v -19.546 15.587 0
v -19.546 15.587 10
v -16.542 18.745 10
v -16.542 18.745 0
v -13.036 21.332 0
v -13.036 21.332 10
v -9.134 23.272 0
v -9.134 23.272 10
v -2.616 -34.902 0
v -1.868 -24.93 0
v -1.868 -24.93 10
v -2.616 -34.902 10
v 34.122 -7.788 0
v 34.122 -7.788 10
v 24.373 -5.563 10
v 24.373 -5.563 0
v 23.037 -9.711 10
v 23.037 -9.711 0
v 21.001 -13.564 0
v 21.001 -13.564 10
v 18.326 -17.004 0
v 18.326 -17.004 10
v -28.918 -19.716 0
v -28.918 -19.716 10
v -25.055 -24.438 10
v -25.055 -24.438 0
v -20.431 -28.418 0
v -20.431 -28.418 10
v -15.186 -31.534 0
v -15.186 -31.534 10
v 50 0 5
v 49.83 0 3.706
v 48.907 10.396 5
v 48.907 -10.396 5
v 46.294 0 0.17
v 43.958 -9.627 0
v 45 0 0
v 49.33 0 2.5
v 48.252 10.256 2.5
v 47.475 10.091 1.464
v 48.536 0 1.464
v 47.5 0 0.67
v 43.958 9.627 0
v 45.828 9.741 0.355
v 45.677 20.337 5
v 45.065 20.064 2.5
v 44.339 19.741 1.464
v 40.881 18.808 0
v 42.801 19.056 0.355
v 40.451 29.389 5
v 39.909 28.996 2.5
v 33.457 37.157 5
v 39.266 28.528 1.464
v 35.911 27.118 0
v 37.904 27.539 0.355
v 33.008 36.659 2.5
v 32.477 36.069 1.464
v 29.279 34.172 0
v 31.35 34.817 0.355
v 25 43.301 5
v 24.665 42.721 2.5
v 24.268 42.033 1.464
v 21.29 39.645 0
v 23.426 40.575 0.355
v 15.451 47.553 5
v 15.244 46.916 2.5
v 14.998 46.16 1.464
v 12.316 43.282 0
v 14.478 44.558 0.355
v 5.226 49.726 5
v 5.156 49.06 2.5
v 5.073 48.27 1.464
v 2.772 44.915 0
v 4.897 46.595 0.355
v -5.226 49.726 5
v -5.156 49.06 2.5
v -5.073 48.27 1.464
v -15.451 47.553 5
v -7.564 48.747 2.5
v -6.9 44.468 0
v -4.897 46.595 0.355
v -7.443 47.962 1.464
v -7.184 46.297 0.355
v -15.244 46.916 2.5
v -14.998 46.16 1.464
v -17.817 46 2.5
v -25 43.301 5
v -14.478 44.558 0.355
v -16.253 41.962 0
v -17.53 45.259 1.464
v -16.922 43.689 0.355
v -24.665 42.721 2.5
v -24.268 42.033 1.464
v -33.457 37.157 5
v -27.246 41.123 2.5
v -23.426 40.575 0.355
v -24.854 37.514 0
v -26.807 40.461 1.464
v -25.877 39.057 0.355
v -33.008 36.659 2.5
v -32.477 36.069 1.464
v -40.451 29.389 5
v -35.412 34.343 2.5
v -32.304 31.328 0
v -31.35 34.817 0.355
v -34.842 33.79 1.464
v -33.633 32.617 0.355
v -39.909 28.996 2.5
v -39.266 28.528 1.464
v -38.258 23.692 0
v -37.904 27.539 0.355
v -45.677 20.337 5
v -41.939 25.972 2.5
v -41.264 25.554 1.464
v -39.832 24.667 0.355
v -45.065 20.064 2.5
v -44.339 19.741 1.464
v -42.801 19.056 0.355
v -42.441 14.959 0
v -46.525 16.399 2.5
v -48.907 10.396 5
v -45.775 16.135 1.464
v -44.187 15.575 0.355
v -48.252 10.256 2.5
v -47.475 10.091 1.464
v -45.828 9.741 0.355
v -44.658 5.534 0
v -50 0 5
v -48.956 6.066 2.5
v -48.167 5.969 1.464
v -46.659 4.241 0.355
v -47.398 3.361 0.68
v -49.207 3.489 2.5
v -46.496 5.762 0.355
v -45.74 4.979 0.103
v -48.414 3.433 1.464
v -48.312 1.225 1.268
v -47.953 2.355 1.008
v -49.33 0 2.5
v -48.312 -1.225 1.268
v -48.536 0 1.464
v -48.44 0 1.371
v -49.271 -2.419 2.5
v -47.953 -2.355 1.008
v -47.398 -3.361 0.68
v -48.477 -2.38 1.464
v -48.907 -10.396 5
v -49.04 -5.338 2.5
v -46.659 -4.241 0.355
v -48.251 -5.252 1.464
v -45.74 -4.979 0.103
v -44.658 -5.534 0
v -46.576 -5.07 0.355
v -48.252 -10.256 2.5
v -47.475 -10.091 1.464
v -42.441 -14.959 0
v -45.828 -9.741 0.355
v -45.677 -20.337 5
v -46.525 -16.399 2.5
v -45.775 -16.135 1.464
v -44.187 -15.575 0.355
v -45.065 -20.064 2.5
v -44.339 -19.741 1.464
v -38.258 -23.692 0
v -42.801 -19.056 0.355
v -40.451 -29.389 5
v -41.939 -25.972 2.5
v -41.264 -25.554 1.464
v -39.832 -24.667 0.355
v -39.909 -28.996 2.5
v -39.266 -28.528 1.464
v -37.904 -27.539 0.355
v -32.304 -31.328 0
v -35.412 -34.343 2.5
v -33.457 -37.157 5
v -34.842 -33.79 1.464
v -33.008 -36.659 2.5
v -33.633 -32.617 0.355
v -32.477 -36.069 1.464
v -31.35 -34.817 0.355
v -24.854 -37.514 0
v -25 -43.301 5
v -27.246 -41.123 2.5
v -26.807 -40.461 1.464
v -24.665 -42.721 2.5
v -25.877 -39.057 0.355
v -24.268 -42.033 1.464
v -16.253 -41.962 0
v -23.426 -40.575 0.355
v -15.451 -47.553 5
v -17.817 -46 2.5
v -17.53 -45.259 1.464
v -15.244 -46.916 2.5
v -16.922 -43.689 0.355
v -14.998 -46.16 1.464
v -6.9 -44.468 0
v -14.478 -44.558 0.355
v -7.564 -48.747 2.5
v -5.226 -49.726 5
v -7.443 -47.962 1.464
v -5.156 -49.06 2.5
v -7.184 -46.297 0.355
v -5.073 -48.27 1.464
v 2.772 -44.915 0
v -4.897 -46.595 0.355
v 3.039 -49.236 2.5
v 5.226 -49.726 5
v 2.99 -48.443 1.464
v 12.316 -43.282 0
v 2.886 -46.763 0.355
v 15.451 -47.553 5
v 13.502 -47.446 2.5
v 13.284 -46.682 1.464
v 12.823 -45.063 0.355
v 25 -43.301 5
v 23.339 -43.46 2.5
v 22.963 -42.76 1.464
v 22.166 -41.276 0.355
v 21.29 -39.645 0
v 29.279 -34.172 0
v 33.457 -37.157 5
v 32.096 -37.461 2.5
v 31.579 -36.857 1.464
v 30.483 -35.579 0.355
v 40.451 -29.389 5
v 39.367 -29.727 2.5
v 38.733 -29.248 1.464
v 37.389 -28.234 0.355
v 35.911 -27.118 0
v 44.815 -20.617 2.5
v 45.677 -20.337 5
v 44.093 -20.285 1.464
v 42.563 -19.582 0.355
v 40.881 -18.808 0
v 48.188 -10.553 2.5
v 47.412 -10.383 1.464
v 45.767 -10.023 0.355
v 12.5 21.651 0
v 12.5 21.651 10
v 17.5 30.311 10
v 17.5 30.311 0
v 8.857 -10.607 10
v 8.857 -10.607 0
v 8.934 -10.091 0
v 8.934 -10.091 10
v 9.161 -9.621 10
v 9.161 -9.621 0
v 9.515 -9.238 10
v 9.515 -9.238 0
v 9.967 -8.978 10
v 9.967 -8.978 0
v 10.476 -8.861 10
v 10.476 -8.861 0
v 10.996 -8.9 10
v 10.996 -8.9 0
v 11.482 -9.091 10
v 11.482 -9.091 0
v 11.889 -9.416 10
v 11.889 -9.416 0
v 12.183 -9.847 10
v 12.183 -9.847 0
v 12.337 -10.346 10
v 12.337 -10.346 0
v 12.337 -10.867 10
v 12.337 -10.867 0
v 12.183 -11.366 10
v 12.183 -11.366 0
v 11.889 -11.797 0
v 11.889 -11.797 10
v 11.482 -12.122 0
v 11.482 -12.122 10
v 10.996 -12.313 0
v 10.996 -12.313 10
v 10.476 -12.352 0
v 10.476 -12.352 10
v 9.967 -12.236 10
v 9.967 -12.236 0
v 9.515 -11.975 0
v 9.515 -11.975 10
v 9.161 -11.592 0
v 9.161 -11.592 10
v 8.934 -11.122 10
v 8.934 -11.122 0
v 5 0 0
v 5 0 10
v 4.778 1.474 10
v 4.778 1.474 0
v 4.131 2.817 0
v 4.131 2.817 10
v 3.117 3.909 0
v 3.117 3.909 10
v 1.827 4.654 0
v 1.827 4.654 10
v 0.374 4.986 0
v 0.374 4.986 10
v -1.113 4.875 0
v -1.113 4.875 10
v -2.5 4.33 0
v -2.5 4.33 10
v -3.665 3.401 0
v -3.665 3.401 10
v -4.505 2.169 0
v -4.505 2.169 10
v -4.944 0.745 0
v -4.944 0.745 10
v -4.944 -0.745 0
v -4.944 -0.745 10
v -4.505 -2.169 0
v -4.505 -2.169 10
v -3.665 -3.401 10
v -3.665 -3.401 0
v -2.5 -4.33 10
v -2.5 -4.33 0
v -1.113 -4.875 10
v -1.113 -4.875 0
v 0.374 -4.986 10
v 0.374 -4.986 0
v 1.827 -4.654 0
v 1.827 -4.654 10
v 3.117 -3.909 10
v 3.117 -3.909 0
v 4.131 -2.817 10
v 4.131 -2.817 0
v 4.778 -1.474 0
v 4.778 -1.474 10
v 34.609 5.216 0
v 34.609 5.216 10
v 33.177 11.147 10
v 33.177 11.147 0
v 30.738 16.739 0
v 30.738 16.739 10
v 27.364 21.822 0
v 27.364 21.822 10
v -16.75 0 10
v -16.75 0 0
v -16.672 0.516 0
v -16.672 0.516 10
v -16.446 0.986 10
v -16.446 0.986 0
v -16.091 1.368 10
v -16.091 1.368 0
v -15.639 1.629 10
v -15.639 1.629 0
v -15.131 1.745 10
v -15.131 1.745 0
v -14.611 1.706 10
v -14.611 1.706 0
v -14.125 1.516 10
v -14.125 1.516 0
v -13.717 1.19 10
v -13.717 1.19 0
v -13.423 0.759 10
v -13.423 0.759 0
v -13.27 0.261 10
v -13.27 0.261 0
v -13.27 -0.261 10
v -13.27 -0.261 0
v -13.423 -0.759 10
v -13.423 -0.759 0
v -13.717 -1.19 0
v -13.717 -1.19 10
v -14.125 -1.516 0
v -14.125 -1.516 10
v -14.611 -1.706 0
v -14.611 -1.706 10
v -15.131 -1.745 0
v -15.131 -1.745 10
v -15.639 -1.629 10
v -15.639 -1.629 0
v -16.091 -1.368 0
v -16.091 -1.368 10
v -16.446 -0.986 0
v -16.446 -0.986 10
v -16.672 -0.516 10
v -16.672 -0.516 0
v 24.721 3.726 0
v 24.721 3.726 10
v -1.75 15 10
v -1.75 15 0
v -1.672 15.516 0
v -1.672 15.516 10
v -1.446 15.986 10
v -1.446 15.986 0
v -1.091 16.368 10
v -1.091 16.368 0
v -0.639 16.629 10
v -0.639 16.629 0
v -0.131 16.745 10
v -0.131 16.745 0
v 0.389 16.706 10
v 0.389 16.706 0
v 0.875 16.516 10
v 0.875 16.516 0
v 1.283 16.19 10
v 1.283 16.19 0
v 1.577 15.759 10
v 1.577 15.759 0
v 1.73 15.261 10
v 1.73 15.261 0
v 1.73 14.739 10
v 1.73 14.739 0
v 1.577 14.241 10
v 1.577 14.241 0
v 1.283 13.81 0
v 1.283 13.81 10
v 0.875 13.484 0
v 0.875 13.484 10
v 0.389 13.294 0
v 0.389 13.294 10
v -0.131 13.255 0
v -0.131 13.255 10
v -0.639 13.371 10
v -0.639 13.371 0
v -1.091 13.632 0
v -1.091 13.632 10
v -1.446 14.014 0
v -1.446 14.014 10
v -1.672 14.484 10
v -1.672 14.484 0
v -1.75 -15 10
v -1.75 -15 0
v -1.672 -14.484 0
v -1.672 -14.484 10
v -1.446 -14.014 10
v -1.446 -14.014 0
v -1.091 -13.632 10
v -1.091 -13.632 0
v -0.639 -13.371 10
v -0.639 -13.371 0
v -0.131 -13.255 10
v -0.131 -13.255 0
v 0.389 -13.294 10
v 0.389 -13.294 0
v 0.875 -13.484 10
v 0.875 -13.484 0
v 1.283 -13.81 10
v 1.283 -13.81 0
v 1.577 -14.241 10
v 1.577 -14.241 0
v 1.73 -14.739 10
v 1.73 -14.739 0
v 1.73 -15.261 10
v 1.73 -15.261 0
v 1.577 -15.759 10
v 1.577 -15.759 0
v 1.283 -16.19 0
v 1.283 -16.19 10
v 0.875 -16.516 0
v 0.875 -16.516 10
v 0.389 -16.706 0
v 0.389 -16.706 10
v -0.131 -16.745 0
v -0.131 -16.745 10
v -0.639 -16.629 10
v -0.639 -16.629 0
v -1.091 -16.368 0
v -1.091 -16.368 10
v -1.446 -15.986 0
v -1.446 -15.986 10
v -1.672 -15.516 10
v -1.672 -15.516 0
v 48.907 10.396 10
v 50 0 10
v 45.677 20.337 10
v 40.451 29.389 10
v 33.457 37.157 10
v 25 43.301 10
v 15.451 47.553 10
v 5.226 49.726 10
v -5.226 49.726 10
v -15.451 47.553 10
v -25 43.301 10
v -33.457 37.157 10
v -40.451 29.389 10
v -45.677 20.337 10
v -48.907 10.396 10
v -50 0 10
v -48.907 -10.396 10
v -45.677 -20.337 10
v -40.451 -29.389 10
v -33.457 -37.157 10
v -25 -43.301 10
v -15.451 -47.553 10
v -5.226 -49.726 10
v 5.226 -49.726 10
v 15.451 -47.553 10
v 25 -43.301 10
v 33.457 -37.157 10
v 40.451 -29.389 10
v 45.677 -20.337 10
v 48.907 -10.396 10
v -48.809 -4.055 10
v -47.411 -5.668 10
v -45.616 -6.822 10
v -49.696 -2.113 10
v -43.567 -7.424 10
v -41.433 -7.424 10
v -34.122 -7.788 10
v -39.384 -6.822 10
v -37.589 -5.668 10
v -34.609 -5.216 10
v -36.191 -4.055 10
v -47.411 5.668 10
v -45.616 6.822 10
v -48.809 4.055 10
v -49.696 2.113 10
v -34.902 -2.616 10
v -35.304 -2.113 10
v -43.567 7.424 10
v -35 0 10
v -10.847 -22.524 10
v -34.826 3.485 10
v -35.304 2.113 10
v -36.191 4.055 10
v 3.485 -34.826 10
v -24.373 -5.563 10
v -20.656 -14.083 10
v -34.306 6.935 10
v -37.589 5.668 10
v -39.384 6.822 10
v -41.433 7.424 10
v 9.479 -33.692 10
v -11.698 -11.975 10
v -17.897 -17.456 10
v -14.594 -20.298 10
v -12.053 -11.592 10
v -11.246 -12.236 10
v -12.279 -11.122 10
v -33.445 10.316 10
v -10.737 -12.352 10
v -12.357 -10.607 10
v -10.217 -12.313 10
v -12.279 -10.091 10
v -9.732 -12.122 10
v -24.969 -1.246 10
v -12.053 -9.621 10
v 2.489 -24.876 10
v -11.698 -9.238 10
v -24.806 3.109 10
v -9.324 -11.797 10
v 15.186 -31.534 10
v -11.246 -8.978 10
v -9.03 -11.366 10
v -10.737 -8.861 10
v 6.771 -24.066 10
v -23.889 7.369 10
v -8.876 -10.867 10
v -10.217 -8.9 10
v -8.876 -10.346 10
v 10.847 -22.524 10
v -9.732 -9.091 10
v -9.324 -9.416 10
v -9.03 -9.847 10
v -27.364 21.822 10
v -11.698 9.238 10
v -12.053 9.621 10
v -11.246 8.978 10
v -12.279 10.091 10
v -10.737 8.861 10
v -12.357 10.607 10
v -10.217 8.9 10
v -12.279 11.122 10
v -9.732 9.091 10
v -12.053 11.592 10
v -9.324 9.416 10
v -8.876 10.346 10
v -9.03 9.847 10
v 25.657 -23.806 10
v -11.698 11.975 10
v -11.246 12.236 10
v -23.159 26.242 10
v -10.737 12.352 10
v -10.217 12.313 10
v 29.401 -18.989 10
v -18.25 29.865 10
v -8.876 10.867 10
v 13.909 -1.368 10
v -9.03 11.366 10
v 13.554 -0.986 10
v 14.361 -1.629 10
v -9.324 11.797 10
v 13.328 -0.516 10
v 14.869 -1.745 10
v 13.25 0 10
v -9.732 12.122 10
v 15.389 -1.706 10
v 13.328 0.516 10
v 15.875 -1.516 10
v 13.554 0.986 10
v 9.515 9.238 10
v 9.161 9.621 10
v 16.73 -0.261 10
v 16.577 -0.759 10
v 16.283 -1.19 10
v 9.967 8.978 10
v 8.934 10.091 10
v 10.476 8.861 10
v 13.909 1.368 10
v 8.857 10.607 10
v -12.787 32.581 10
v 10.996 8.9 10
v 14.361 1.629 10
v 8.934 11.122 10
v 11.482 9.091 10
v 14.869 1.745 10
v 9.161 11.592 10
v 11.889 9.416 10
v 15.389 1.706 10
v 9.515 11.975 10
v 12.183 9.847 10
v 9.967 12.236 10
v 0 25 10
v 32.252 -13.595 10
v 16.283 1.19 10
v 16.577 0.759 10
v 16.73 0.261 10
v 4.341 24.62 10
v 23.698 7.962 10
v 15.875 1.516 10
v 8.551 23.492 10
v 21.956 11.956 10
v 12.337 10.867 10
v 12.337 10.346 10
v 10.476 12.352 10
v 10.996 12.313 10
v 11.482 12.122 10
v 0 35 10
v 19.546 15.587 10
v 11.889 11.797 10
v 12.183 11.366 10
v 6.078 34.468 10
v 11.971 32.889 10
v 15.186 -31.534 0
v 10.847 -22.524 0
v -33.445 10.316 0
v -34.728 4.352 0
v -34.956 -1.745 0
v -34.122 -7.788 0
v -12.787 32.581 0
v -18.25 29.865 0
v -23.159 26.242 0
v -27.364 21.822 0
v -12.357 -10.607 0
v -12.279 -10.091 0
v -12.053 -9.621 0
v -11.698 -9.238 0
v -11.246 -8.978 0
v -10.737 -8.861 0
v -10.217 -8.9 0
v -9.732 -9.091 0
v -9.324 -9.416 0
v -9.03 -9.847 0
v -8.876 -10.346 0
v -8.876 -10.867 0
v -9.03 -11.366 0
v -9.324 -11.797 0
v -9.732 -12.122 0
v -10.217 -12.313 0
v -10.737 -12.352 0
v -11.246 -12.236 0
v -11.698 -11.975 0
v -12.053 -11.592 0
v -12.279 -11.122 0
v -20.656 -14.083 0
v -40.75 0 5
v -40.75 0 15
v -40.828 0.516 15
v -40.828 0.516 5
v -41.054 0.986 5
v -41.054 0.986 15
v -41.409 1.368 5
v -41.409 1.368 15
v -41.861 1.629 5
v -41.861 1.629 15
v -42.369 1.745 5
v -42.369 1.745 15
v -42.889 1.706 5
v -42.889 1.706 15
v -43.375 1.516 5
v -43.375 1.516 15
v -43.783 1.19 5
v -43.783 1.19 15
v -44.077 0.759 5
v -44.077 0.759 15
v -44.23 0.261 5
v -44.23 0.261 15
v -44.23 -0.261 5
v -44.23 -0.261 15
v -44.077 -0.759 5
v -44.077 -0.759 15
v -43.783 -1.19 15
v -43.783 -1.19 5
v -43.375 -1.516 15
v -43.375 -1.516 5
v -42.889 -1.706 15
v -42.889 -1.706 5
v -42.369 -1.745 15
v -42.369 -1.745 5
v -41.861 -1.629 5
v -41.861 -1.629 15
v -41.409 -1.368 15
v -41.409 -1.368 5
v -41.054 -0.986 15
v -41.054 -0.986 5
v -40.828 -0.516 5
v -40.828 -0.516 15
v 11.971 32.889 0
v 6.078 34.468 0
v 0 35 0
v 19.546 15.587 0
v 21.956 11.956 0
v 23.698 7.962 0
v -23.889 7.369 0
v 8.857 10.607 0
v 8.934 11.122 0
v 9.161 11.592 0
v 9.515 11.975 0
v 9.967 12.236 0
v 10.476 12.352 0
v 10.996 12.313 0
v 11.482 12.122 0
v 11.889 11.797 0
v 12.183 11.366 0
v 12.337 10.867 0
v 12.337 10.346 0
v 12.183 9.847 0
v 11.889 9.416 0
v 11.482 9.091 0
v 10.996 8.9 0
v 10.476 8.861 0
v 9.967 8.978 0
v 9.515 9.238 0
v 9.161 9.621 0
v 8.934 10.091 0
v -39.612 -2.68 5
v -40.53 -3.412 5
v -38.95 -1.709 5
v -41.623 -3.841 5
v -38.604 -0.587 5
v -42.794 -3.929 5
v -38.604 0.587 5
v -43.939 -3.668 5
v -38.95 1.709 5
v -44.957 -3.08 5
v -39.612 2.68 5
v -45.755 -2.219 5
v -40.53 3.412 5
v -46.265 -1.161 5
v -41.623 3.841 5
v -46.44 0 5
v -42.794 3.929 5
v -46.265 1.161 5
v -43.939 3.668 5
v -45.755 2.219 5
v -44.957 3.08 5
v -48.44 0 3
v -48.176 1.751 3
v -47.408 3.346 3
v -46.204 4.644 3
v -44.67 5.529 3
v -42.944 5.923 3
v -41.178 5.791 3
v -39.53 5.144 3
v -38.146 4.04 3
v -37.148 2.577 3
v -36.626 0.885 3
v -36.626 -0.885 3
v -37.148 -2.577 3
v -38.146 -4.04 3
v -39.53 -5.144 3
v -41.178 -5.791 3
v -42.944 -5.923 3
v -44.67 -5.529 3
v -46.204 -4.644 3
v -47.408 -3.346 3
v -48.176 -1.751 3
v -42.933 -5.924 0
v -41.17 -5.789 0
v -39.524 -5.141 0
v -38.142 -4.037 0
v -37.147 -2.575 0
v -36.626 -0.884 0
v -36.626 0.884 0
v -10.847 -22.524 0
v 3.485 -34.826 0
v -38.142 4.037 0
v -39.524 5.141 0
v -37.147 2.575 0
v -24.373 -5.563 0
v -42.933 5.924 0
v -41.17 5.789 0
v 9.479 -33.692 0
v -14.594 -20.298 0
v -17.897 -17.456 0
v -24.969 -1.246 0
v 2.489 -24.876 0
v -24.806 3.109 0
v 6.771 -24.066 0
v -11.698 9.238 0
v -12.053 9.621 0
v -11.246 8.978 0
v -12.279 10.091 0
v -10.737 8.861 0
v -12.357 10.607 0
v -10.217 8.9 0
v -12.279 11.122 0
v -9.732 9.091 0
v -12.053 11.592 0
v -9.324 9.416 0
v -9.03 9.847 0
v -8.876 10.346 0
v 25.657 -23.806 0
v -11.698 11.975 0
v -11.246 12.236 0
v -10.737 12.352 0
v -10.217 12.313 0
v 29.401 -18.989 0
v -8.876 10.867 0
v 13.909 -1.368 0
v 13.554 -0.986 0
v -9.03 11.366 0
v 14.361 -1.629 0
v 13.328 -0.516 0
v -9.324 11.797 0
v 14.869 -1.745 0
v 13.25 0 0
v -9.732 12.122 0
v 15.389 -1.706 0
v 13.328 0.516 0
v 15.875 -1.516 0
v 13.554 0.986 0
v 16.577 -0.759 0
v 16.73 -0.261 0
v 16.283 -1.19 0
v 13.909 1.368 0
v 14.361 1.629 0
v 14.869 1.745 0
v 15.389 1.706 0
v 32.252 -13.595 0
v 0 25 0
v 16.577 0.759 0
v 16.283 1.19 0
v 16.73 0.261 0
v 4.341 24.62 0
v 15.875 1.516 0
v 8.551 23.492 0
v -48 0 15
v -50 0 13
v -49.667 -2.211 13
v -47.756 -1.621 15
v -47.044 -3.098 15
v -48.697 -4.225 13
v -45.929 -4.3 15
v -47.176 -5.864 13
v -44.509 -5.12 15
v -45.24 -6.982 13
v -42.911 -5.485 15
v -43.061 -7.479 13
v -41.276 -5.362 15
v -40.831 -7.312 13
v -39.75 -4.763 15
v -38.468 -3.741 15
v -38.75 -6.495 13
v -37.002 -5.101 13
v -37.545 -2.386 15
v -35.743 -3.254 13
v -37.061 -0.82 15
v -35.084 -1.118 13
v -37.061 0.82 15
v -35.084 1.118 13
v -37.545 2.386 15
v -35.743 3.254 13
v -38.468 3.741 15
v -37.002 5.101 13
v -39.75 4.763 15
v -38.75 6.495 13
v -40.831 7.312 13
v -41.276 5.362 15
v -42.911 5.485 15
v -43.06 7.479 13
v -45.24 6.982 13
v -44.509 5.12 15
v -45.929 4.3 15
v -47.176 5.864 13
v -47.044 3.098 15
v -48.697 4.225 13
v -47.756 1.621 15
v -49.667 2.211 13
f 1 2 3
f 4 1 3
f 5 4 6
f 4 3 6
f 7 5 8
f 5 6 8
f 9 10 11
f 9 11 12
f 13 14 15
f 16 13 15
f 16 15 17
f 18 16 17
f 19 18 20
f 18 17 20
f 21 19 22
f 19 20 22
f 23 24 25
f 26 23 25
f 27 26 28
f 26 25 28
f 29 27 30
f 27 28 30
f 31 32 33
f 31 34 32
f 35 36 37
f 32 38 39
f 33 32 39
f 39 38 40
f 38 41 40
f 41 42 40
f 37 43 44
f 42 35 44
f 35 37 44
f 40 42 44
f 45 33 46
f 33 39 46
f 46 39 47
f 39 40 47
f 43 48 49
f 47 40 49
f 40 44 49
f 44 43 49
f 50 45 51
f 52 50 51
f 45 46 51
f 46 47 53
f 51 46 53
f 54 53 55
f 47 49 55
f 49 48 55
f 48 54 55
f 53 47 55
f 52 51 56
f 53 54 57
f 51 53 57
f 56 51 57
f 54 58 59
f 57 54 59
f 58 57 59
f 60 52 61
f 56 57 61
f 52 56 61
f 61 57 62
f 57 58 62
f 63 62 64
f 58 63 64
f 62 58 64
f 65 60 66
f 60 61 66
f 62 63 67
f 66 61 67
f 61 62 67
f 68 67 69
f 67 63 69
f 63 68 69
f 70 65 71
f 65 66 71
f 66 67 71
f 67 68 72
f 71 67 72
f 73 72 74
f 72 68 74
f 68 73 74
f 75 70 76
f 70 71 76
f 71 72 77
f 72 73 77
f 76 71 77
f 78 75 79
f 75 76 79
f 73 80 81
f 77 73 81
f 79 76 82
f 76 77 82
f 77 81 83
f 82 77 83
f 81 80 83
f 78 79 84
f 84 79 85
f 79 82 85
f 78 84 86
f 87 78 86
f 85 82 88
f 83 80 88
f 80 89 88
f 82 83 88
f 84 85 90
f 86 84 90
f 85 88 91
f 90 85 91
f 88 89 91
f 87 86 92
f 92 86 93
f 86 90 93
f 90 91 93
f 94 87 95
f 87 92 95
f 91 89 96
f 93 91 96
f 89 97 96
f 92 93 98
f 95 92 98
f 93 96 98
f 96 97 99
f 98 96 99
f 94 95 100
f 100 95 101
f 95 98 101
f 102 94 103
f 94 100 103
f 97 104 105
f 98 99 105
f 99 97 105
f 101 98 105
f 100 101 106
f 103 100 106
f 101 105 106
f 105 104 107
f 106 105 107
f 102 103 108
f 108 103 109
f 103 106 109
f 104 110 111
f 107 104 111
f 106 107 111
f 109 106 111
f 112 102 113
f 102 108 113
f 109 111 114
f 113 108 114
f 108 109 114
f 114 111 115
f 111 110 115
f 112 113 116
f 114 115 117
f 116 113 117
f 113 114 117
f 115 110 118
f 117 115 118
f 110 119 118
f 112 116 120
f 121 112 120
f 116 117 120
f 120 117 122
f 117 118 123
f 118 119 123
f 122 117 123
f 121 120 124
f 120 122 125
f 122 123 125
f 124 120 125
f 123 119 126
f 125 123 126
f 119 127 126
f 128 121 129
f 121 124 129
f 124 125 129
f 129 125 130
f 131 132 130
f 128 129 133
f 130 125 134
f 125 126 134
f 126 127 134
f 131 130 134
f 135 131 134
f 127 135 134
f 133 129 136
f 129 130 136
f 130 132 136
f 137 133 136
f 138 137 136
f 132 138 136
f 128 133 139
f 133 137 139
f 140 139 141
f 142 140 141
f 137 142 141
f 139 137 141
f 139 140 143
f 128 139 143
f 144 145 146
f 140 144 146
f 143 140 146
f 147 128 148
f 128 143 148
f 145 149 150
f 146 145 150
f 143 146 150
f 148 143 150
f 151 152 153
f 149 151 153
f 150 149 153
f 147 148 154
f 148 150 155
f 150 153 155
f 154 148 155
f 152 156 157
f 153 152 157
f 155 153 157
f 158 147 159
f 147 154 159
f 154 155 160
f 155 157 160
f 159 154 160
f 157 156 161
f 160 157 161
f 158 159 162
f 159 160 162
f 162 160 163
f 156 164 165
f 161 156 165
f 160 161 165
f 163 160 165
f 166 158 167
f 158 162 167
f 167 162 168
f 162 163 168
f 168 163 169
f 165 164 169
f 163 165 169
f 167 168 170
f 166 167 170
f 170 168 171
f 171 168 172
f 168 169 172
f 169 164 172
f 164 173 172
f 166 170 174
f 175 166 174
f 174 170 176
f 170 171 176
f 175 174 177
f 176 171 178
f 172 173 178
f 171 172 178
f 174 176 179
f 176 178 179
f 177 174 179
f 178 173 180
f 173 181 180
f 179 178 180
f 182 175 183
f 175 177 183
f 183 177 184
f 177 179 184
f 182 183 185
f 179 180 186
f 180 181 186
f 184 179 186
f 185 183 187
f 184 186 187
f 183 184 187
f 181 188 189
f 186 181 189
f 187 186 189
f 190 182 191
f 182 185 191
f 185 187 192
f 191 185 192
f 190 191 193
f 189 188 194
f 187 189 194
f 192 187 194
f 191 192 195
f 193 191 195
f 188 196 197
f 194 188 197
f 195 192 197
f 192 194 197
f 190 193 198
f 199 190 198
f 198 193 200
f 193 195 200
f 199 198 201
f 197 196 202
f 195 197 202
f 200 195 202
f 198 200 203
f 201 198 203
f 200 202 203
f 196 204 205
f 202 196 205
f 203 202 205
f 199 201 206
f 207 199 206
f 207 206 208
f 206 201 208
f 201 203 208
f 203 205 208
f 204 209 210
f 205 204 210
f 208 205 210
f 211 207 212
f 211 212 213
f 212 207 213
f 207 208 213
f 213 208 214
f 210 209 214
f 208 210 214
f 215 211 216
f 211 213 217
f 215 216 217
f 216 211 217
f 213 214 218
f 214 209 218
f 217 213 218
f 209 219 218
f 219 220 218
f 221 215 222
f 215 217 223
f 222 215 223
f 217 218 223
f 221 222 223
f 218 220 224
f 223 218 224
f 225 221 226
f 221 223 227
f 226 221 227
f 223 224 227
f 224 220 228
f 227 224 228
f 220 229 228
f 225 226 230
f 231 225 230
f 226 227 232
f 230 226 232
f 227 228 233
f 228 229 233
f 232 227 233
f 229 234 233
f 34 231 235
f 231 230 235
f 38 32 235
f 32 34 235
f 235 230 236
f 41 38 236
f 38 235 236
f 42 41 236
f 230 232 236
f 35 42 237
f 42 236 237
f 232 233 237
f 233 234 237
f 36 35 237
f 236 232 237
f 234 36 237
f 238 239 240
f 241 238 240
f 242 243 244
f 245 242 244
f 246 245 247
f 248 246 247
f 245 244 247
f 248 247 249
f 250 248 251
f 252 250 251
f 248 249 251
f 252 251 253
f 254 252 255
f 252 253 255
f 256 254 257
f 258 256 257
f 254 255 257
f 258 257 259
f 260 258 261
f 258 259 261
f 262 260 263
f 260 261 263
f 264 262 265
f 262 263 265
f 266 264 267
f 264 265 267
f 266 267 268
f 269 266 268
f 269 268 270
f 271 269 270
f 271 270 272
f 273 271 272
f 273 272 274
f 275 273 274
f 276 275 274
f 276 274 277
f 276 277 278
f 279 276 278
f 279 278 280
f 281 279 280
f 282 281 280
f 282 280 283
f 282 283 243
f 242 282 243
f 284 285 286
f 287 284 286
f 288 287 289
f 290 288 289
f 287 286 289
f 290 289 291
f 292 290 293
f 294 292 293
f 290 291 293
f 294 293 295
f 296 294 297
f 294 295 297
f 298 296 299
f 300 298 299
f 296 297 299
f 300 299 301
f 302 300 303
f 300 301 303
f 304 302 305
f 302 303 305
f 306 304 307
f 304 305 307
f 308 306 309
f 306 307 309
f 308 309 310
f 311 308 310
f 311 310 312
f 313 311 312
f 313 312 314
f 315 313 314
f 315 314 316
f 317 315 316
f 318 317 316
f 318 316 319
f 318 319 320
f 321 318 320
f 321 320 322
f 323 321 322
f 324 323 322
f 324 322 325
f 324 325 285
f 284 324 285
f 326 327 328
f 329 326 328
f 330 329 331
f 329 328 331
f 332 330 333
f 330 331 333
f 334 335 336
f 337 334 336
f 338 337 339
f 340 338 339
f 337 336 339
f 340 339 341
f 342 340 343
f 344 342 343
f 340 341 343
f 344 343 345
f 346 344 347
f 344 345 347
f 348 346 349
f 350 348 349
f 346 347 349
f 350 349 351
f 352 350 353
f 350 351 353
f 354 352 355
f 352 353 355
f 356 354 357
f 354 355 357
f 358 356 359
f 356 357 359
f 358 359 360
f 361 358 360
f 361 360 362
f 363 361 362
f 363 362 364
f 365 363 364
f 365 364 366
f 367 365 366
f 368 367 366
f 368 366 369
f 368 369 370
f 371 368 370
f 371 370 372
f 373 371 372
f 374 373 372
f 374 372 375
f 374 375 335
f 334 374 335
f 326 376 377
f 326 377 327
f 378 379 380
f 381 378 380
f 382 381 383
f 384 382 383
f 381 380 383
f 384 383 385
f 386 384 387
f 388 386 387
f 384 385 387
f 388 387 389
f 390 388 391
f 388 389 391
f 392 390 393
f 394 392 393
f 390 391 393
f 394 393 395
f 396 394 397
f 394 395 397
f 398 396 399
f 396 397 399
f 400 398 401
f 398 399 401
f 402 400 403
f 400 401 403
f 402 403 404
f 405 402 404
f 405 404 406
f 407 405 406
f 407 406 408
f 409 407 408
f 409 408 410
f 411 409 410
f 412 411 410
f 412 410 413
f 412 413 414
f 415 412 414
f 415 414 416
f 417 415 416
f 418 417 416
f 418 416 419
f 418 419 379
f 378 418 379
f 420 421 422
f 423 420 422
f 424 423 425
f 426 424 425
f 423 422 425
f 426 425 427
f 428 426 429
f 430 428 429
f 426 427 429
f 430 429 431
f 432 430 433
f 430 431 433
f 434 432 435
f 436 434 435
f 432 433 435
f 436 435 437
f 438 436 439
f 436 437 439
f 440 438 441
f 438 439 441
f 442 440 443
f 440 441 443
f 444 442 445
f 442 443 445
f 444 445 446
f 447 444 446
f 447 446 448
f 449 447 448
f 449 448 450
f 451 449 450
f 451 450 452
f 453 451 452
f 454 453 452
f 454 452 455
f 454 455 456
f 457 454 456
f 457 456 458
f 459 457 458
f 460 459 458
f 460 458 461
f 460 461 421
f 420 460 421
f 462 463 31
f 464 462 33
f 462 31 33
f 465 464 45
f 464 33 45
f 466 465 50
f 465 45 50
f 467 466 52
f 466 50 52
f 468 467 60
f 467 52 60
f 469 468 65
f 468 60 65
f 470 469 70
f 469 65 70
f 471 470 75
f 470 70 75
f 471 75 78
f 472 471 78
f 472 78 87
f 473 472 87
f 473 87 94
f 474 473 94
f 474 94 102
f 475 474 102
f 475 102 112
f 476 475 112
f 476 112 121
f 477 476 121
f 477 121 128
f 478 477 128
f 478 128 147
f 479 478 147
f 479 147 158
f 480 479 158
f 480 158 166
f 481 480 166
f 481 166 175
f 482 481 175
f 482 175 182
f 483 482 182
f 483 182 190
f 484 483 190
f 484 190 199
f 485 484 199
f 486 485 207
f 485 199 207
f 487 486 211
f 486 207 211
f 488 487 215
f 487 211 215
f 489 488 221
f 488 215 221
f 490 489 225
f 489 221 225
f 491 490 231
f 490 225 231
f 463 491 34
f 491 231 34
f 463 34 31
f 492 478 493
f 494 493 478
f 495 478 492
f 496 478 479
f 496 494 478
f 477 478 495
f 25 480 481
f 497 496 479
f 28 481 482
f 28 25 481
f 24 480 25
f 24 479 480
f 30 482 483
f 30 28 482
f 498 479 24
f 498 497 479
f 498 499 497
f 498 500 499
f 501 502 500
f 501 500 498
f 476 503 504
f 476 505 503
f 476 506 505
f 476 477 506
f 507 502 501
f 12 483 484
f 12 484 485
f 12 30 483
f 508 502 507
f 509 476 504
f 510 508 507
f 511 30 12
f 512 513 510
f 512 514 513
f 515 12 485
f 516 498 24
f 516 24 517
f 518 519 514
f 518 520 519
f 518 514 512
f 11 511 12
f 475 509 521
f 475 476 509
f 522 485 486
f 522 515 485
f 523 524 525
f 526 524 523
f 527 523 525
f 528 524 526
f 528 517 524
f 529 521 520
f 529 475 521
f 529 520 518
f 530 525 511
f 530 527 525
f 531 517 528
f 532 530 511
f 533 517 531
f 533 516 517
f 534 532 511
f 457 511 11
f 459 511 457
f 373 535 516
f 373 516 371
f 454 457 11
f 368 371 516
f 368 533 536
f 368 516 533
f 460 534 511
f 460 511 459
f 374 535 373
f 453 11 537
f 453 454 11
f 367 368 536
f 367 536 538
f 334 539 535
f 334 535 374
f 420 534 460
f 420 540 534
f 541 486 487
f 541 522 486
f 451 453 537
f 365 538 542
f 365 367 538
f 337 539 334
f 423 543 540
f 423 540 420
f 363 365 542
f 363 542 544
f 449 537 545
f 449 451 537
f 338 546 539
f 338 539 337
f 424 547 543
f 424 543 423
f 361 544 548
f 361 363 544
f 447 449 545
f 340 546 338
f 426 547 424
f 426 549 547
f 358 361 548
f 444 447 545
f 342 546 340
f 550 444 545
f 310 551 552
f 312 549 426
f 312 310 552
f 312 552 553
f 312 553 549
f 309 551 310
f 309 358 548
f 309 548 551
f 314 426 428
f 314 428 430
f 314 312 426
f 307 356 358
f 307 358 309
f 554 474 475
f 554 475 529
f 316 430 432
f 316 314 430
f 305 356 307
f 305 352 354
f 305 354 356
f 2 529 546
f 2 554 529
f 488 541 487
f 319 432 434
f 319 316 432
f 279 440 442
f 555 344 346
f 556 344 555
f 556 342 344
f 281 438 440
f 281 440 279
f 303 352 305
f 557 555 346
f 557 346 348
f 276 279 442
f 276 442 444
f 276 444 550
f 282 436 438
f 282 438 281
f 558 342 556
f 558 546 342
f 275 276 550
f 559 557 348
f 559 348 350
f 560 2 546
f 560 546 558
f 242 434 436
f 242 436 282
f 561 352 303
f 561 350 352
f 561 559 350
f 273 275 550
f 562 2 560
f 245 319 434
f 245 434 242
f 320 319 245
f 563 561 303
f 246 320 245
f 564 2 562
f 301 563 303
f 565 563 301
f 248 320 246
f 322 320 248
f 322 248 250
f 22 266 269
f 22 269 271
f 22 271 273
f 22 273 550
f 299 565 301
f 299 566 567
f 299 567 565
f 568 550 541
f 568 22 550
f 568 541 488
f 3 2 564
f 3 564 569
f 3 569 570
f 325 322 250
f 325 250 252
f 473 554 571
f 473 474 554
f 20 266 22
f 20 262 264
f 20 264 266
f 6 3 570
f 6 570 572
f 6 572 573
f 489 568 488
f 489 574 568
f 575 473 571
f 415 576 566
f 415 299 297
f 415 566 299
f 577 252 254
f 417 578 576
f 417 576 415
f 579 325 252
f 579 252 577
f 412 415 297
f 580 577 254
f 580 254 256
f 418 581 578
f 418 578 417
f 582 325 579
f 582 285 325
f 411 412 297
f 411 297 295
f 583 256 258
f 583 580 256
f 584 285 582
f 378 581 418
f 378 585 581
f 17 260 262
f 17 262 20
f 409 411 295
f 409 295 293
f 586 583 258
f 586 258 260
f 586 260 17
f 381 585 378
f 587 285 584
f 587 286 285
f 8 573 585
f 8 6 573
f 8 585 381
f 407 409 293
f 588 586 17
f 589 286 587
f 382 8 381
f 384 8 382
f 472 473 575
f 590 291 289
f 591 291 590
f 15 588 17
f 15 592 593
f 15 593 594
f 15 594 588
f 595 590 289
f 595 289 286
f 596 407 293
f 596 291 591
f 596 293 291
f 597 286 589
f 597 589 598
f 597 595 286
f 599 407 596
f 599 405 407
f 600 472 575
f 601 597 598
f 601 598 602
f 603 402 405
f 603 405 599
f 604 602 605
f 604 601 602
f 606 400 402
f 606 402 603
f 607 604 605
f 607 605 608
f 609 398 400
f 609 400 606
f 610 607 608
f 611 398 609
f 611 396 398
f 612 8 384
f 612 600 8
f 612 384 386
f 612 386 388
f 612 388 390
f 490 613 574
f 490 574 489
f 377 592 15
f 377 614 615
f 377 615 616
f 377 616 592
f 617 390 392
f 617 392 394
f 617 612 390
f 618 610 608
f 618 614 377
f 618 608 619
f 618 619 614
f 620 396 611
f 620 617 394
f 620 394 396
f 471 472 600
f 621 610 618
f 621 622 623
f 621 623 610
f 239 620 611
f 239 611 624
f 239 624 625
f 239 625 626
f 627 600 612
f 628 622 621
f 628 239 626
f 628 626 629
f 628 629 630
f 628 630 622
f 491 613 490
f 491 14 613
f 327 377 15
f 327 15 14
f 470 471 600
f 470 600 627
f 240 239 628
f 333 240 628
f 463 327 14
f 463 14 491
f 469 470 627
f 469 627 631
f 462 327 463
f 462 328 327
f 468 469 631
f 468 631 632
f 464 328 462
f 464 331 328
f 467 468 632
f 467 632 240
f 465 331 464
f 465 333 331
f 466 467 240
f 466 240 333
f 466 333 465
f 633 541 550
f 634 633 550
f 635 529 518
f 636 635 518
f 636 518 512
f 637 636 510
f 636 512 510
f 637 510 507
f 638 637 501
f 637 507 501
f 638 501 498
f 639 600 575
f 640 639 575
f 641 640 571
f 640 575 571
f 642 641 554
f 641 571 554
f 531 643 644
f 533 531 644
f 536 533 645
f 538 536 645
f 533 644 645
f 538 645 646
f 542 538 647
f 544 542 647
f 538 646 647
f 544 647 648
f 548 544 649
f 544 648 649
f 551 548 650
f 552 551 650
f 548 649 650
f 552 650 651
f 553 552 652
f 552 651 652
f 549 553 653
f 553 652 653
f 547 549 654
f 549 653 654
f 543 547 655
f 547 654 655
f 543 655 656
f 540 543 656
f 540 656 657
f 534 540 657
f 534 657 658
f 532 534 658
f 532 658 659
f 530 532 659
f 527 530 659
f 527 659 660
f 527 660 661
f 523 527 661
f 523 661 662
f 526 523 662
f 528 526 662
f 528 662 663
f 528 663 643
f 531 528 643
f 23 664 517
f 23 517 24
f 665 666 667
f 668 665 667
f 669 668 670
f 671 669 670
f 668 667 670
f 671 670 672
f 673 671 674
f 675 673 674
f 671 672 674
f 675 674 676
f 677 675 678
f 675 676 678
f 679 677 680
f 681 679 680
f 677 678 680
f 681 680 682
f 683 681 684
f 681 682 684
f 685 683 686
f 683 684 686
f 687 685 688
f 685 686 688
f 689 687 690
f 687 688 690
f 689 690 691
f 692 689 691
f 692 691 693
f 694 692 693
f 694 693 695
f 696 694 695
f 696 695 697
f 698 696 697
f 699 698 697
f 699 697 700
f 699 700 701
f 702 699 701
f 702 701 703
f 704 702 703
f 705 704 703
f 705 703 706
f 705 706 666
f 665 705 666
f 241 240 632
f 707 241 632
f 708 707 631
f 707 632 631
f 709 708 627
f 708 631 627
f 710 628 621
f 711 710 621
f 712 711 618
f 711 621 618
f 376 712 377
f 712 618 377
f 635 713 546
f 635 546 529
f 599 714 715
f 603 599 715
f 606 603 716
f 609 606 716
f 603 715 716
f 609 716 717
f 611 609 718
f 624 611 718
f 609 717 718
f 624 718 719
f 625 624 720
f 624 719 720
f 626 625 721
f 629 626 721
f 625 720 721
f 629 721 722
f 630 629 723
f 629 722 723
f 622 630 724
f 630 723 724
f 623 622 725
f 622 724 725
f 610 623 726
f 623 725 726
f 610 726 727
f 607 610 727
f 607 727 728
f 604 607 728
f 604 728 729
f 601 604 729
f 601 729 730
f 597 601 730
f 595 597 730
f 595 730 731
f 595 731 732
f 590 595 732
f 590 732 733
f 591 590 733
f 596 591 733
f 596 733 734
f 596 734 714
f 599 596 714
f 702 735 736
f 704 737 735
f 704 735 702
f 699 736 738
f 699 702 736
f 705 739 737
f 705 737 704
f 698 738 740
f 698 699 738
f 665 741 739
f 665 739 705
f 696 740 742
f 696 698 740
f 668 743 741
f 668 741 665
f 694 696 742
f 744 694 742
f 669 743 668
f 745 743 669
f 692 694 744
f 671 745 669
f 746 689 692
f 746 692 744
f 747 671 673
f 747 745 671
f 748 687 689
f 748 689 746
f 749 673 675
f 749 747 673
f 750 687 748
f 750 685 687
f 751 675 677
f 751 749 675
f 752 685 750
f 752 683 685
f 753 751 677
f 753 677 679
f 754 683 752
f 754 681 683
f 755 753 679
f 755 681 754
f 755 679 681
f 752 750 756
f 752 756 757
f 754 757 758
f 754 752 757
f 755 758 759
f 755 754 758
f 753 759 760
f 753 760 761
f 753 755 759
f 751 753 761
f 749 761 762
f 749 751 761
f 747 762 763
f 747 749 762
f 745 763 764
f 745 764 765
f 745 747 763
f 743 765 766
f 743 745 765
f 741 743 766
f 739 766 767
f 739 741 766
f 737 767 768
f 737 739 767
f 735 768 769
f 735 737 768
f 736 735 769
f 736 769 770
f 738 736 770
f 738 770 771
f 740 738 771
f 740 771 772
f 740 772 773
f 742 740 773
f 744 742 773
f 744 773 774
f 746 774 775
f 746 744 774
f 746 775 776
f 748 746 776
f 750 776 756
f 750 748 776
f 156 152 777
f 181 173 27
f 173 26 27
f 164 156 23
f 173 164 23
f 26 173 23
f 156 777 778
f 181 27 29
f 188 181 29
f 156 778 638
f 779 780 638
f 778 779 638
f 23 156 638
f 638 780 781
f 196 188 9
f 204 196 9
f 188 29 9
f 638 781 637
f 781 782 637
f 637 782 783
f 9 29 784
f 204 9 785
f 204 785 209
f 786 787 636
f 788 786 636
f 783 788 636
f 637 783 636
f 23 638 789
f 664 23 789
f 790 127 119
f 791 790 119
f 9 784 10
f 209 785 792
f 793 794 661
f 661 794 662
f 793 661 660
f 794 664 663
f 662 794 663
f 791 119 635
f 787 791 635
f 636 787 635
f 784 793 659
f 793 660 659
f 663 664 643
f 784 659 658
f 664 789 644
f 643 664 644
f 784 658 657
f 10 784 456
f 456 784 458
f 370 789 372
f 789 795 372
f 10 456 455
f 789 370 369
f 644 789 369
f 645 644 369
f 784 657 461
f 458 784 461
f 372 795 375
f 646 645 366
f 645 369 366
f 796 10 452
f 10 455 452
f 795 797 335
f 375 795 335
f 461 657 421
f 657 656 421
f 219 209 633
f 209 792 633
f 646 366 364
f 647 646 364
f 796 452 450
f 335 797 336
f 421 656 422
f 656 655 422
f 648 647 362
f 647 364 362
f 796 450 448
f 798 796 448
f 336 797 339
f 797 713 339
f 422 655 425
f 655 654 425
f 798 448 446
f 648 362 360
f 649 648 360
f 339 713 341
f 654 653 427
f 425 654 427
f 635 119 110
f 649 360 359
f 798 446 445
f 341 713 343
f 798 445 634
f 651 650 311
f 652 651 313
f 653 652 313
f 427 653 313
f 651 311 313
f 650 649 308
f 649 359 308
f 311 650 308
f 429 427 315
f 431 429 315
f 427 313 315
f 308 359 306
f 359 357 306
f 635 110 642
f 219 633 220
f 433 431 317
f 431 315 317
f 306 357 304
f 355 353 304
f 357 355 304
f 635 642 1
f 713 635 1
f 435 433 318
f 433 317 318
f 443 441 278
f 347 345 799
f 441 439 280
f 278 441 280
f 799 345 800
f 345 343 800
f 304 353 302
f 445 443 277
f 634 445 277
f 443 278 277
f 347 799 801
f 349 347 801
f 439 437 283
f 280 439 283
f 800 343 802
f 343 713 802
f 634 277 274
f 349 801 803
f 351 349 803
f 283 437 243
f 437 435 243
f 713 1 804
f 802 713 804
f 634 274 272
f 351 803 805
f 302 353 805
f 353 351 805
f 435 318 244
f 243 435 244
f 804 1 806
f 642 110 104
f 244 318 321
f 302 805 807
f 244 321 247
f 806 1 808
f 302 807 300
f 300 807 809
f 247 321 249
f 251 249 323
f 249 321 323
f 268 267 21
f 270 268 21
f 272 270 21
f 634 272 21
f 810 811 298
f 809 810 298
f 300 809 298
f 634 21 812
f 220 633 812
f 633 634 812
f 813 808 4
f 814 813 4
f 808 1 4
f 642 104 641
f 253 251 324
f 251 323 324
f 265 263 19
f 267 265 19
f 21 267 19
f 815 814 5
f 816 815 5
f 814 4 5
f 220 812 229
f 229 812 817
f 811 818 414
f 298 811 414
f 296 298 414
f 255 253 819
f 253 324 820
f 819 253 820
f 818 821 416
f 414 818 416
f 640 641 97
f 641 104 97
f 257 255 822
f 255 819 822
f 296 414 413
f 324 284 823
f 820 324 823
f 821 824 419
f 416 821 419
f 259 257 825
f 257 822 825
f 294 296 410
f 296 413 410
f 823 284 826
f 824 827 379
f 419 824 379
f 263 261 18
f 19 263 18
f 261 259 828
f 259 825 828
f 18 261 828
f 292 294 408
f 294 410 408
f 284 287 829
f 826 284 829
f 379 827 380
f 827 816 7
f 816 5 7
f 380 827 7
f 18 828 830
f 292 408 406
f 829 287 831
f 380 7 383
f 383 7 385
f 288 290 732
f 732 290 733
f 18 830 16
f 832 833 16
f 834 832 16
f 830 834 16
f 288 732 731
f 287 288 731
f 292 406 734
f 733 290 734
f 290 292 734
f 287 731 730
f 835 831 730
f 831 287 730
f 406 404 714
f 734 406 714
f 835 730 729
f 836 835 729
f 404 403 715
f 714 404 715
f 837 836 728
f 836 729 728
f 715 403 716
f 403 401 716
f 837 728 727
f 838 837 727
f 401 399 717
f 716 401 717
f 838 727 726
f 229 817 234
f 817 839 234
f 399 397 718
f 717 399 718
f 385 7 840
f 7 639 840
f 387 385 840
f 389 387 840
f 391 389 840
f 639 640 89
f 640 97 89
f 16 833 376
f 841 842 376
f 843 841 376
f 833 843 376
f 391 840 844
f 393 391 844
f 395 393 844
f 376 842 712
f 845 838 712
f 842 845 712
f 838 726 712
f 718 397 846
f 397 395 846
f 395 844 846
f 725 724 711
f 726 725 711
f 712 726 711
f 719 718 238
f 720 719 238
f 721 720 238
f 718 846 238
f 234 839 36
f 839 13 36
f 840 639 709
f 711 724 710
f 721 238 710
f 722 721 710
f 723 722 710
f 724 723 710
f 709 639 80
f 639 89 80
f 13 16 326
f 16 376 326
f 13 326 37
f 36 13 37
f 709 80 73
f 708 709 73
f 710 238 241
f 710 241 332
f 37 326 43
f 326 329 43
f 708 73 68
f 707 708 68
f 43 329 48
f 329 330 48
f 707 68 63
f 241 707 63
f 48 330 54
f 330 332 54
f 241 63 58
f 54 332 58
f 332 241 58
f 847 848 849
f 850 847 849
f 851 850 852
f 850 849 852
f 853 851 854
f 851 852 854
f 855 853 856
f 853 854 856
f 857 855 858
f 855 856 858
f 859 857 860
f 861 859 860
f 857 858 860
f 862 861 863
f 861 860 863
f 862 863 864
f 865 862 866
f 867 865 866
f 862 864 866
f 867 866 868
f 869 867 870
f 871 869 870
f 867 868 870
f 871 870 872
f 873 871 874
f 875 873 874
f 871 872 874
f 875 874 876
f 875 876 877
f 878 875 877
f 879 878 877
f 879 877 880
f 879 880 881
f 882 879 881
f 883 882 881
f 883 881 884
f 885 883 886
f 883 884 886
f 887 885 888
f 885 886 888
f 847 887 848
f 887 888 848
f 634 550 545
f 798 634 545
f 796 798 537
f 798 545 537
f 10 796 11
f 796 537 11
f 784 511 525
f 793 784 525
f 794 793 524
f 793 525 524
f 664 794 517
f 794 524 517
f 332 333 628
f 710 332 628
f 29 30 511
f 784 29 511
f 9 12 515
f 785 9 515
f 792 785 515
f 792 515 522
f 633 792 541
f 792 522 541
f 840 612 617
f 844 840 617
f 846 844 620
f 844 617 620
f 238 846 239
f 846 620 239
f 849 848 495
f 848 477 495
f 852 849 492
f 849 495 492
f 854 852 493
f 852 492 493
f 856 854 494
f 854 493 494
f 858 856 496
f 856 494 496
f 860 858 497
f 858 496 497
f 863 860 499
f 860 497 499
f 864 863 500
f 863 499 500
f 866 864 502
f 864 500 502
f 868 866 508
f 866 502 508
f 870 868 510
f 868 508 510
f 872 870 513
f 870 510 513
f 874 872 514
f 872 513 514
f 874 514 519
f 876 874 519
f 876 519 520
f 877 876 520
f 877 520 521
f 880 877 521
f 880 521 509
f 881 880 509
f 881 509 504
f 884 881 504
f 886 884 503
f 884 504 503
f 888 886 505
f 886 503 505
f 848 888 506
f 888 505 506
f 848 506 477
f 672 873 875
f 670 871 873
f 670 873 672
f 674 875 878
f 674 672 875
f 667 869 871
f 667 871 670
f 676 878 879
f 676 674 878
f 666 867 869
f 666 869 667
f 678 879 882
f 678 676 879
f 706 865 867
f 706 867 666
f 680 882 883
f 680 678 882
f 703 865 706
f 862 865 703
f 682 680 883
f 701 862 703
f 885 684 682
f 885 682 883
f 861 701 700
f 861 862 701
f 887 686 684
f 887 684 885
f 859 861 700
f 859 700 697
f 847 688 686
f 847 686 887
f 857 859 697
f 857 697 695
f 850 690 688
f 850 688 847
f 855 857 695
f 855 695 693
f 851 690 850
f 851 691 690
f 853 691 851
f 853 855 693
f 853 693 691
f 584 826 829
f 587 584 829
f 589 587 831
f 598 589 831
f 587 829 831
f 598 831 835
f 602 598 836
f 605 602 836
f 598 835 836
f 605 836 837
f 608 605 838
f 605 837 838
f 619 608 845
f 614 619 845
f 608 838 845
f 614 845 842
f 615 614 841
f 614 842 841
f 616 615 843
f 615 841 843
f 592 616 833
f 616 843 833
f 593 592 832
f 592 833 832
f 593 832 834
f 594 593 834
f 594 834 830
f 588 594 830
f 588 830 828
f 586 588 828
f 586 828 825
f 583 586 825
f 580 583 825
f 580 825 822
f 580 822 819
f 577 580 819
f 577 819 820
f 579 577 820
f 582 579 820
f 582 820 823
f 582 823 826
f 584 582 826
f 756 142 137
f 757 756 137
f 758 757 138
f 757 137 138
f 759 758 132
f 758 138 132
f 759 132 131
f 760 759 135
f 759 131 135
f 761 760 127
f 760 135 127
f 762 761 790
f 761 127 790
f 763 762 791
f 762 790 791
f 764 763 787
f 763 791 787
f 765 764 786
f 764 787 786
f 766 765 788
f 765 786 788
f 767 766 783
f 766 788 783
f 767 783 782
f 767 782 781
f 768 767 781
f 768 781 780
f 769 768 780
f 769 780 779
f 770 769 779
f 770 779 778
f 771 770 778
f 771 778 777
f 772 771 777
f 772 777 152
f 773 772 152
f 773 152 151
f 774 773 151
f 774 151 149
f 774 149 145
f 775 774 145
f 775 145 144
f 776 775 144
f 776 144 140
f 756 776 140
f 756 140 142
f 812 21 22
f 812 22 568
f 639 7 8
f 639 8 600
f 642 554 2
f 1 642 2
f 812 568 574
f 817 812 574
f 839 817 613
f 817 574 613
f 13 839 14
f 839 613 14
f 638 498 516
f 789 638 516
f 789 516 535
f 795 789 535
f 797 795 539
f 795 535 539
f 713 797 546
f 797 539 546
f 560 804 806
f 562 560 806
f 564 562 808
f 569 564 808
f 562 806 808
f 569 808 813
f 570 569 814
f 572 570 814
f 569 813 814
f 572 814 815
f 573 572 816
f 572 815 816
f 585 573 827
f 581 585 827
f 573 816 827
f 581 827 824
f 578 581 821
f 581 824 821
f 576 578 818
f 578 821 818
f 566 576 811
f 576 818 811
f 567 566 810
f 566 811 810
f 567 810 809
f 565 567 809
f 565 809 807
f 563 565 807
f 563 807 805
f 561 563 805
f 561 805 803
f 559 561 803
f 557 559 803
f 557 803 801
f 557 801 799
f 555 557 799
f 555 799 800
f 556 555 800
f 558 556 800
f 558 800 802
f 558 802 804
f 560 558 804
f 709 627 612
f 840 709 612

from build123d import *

# Parameters (mm, degrees)
SKETCH1_R           = 50
BOSS_EXTRUDE1_DEPTH = 10
SKETCH2_R           = 5
CUT_EXTRUDE1_DEPTH  = 72.414284285
FILLET1_R           = 5
SKETCH3_R           = 1.75
CUT_EXTRUDE2_DEPTH  = 72.414284425
SKETCH5_R           = 7.5
BOSS_EXTRUDE2_DEPTH = 5
SKETCH6_R           = 1.75
CUT_EXTRUDE3_DEPTH  = 73.284161612
SKETCH7_R           = 5.939963611
CUT_EXTRUDE4_DEPTH  = 5
CHAMFER1_SIZE       = 2
CHAMFER2_SIZE       = 2
CUT_EXTRUDE5_DEPTH  = 72.414284439
CIRPATTERN1_COUNT   = 7


with BuildPart() as part:
    # Sketch1 → Boss-Extrude1 (new body)
    with BuildSketch(Plane.XY):
        Circle(SKETCH1_R)
    extrude(amount=BOSS_EXTRUDE1_DEPTH)

    # Sketch2 → Cut-Extrude1 (cut, through all)
    with BuildSketch(Plane.XY.offset(10)):
        Circle(SKETCH2_R)
    extrude(amount=-CUT_EXTRUDE1_DEPTH, mode=Mode.SUBTRACT)

    # Fillet1
    fillet1_edges = [part.edges().sort_by_distance(p)[0] for p in [
        (-50, 0, 0),
    ]]
    fillet(fillet1_edges, radius=FILLET1_R)

    # Sketch3 → Cut-Extrude2 (cut, through all)
    with BuildSketch(Plane(origin=(0, 0, 0), x_dir=(-1, 0, 0), z_dir=(0, 0, -1))):
        with Locations((0, 15)):
            Circle(SKETCH3_R)
        with Locations((10.606601718, 10.606601718)):
            Circle(SKETCH3_R)
        with Locations((15, 0)):
            Circle(SKETCH3_R)
        with Locations((10.606601718, -10.606601718)):
            Circle(SKETCH3_R)
        with Locations((0, -15)):
            Circle(SKETCH3_R)
        with Locations((-10.606601718, -10.606601718)):
            Circle(SKETCH3_R)
        with Locations((-15, 0)):
            Circle(SKETCH3_R)
        with Locations((-10.606601718, 10.606601718)):
            Circle(SKETCH3_R)
    extrude(amount=-CUT_EXTRUDE2_DEPTH, mode=Mode.SUBTRACT)

    # Sketch5 → Boss-Extrude2 (add)
    with BuildSketch(Plane.XY.offset(10)):
        with Locations(Location((-42.5, 0, 0), (0, 0, 179.999679023))):
            Circle(SKETCH5_R)
    extrude(amount=BOSS_EXTRUDE2_DEPTH)

    # Sketch6 → Cut-Extrude3 (cut, through all)
    with BuildSketch(Plane.XY.offset(15)):
        with Locations((-42.5, 0)):
            Circle(SKETCH6_R)
    extrude(amount=-CUT_EXTRUDE3_DEPTH, mode=Mode.SUBTRACT)

    # Sketch7 → Cut-Extrude4 (cut)
    with BuildSketch(Plane(origin=(0, 0, 0), x_dir=(-1, 0, 0), z_dir=(0, 0, -1))):
        with Locations((42.5, 0)):
            Circle(SKETCH7_R)
    extrude(amount=-CUT_EXTRUDE4_DEPTH, mode=Mode.SUBTRACT)

    # Chamfer1
    chamfer1_edges = [part.edges().sort_by_distance(p)[0] for p in [
        (-36.560036389, 0, 5),
    ]]
    chamfer(chamfer1_edges, length=CHAMFER1_SIZE)

    # Chamfer2
    chamfer2_edges = [part.edges().sort_by_distance(p)[0] for p in [
        (-35, -4.2016e-05, 15),
    ]]
    chamfer(chamfer2_edges, length=CHAMFER2_SIZE)

    # Sketch8 → Cut-Extrude5 (cut, through all)
    with BuildSketch(Plane.XY.offset(10)):
        with BuildLine():
            Line((0, 35), (0, 25))
            ThreePointArc((0, 25), (6.470476128, 24.148145657), (12.5, 21.650635095))
            Line((12.5, 21.650635095), (17.5, 30.310889132))
            ThreePointArc((17.5, 30.310889132), (9.058666579, 33.80740392), (0, 35))
        make_face()
    cut_extrude5 = extrude(amount=-CUT_EXTRUDE5_DEPTH, mode=Mode.SUBTRACT)

    # CirPattern1: Cut-Extrude5 ×7 about axis
    cirpattern1_axis = Axis((0, 0, 0), (0, 0, 1))
    for i in range(1, CIRPATTERN1_COUNT):
        add(cut_extrude5.rotate(cirpattern1_axis, i * 360 / CIRPATTERN1_COUNT), mode=Mode.SUBTRACT)


solid = part.part
